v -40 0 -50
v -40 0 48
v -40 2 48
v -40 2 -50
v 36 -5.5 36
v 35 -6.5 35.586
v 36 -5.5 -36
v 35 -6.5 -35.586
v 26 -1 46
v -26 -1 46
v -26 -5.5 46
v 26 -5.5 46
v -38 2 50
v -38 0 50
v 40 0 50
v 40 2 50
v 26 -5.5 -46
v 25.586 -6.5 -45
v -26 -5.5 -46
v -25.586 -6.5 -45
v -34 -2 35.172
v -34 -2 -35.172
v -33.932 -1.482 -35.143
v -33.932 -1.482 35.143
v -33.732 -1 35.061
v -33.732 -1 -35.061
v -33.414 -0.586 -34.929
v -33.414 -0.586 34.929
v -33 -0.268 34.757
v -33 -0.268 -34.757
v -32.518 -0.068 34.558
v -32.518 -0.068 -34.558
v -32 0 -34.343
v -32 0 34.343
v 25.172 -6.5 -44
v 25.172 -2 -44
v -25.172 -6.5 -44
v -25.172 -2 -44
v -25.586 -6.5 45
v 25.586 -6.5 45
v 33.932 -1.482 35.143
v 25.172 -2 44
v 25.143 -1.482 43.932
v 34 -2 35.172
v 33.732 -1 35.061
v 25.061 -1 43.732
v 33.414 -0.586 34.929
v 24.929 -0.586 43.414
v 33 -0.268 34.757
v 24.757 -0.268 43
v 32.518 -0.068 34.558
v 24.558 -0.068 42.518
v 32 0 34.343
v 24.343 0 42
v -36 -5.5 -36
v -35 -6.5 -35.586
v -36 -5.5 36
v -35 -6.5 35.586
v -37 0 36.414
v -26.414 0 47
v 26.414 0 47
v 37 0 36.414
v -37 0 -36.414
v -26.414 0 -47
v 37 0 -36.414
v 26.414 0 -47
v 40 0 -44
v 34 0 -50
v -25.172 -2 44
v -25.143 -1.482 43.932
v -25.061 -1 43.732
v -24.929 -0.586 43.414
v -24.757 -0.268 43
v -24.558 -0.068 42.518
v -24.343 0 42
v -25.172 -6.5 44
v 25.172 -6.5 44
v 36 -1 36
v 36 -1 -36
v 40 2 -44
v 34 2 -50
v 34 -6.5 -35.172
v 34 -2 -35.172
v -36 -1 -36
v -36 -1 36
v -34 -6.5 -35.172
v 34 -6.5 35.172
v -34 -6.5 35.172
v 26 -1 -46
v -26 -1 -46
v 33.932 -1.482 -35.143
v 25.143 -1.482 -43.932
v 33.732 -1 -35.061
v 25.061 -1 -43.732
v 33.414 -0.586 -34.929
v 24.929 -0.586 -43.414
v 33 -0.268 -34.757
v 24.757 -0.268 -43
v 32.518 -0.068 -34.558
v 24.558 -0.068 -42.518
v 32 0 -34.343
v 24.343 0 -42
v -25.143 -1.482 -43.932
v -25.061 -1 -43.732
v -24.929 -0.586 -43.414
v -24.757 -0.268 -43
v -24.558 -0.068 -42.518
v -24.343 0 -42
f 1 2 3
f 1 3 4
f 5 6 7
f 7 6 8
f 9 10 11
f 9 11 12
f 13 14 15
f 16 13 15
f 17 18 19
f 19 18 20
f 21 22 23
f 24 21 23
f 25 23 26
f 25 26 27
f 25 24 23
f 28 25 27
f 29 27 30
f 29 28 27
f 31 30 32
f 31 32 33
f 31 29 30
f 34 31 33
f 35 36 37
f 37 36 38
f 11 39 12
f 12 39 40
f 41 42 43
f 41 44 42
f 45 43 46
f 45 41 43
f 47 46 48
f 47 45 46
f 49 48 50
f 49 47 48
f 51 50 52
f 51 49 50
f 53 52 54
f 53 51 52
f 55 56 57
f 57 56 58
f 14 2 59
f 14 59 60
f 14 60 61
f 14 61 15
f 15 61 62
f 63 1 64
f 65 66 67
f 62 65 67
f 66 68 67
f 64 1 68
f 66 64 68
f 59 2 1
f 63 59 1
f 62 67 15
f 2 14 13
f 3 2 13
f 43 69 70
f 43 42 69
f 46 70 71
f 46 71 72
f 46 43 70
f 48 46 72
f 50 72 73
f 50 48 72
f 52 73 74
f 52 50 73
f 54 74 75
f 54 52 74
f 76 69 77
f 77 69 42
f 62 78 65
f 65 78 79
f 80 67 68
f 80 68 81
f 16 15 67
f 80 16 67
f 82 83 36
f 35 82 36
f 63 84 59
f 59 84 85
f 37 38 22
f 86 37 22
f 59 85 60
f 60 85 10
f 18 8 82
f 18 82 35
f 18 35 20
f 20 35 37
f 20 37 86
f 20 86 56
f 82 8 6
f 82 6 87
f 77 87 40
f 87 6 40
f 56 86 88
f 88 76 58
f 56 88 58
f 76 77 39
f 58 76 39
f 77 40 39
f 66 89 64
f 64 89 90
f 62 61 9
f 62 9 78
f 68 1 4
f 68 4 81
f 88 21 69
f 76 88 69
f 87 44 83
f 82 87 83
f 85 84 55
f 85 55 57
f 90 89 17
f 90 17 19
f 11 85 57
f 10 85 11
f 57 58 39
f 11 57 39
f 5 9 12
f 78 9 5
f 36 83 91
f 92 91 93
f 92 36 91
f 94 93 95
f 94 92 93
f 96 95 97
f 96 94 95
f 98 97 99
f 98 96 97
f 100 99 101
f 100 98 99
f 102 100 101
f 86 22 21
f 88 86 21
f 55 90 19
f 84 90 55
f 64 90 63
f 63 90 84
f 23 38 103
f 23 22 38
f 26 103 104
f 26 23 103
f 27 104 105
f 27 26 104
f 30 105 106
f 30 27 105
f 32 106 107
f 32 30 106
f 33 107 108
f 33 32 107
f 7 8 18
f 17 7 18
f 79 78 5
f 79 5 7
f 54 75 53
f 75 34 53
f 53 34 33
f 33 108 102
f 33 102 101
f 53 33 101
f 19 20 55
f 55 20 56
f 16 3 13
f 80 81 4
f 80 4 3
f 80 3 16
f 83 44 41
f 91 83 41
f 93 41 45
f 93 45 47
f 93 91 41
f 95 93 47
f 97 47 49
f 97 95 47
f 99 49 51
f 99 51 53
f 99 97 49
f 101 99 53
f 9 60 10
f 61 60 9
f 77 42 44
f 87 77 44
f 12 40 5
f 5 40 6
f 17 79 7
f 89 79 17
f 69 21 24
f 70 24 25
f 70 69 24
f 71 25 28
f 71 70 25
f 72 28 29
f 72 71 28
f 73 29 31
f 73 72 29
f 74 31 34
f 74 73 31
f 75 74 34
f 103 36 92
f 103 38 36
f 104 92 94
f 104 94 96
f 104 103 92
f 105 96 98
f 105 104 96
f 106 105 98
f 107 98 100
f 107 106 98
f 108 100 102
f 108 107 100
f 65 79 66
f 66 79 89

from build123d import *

# Parameters (mm, degrees)
SKETCH1_W           = 80
SKETCH1_H           = 100
BOSS_EXTRUDE1_DEPTH = 2
CHAMFER1_SIZE       = 2
CHAMFER2_SIZE       = 6
BOSS_EXTRUDE2_DEPTH = 6.5
CHAMFER3_SIZE       = 1
CHAMFER4_SIZE       = 1
FILLET1_R           = 2


with BuildPart() as part:
    # Sketch1 → Boss-Extrude1 (new body)
    with BuildSketch(Plane(origin=(0, 0, 0), x_dir=(1, 0, 0), z_dir=(0, 1, 0))):
        Rectangle(SKETCH1_W, SKETCH1_H)
    extrude(amount=BOSS_EXTRUDE1_DEPTH)

    # Chamfer1
    chamfer1_edges = [part.edges().sort_by_distance(p)[0] for p in [
        (-40, 1, 50),
    ]]
    chamfer(chamfer1_edges, length=CHAMFER1_SIZE)

    # Chamfer2
    chamfer2_edges = [part.edges().sort_by_distance(p)[0] for p in [
        (40, 1, -50),
    ]]
    chamfer(chamfer2_edges, length=CHAMFER2_SIZE)

    # Sketch3 → Boss-Extrude2 (add)
    with BuildSketch(Plane.XZ):
        Polygon((26, 46), (36, 36), (36, -36), (26, -46), (-26, -46), (-36, -36), (-36, 36), (-26, 46), align=None)
        Polygon((25.171572875, 44), (34, 35.171572875), (34, -35.171572875), (25.171572875, -44), (-25.171572875, -44), (-34, -35.171572875), (-34, 35.171572875), (-25.171572875, 44), align=None, mode=Mode.SUBTRACT)
    extrude(amount=BOSS_EXTRUDE2_DEPTH)

    # Chamfer3
    chamfer3_edges = [part.edges().sort_by_distance(p)[0] for p in [
        (0, -6.5, 46),
        (-31, -6.5, 41),
        (-36, -6.5, 0),
        (-31, -6.5, -41),
        (0, -6.5, -46),
        (31, -6.5, -41),
        (36, -6.5, 0),
        (31, -6.5, 41),
    ]]
    chamfer(chamfer3_edges, length=CHAMFER3_SIZE)

    # Chamfer4
    chamfer4_edges = [part.edges().sort_by_distance(p)[0] for p in [
        (0, 0, 46),
        (-31, 0, 41),
        (-36, 0, 0),
        (-31, 0, -41),
        (0, 0, -46),
        (31, 0, -41),
        (36, 0, 0),
        (31, 0, 41),
    ]]
    chamfer(chamfer4_edges, length=CHAMFER4_SIZE)

    # Fillet1
    fillet1_edges = [part.edges().sort_by_distance(p)[0] for p in [
        (0, 0, 44),
        (-29.585786438, 0, 39.585786438),
        (-34, 0, 0),
        (-29.585786438, 0, -39.585786438),
        (0, 0, -44),
        (29.585786438, 0, -39.585786438),
        (34, 0, 0),
        (29.585786438, 0, 39.585786438),
    ]]
    fillet(fillet1_edges, radius=FILLET1_R)


solid = part.part
